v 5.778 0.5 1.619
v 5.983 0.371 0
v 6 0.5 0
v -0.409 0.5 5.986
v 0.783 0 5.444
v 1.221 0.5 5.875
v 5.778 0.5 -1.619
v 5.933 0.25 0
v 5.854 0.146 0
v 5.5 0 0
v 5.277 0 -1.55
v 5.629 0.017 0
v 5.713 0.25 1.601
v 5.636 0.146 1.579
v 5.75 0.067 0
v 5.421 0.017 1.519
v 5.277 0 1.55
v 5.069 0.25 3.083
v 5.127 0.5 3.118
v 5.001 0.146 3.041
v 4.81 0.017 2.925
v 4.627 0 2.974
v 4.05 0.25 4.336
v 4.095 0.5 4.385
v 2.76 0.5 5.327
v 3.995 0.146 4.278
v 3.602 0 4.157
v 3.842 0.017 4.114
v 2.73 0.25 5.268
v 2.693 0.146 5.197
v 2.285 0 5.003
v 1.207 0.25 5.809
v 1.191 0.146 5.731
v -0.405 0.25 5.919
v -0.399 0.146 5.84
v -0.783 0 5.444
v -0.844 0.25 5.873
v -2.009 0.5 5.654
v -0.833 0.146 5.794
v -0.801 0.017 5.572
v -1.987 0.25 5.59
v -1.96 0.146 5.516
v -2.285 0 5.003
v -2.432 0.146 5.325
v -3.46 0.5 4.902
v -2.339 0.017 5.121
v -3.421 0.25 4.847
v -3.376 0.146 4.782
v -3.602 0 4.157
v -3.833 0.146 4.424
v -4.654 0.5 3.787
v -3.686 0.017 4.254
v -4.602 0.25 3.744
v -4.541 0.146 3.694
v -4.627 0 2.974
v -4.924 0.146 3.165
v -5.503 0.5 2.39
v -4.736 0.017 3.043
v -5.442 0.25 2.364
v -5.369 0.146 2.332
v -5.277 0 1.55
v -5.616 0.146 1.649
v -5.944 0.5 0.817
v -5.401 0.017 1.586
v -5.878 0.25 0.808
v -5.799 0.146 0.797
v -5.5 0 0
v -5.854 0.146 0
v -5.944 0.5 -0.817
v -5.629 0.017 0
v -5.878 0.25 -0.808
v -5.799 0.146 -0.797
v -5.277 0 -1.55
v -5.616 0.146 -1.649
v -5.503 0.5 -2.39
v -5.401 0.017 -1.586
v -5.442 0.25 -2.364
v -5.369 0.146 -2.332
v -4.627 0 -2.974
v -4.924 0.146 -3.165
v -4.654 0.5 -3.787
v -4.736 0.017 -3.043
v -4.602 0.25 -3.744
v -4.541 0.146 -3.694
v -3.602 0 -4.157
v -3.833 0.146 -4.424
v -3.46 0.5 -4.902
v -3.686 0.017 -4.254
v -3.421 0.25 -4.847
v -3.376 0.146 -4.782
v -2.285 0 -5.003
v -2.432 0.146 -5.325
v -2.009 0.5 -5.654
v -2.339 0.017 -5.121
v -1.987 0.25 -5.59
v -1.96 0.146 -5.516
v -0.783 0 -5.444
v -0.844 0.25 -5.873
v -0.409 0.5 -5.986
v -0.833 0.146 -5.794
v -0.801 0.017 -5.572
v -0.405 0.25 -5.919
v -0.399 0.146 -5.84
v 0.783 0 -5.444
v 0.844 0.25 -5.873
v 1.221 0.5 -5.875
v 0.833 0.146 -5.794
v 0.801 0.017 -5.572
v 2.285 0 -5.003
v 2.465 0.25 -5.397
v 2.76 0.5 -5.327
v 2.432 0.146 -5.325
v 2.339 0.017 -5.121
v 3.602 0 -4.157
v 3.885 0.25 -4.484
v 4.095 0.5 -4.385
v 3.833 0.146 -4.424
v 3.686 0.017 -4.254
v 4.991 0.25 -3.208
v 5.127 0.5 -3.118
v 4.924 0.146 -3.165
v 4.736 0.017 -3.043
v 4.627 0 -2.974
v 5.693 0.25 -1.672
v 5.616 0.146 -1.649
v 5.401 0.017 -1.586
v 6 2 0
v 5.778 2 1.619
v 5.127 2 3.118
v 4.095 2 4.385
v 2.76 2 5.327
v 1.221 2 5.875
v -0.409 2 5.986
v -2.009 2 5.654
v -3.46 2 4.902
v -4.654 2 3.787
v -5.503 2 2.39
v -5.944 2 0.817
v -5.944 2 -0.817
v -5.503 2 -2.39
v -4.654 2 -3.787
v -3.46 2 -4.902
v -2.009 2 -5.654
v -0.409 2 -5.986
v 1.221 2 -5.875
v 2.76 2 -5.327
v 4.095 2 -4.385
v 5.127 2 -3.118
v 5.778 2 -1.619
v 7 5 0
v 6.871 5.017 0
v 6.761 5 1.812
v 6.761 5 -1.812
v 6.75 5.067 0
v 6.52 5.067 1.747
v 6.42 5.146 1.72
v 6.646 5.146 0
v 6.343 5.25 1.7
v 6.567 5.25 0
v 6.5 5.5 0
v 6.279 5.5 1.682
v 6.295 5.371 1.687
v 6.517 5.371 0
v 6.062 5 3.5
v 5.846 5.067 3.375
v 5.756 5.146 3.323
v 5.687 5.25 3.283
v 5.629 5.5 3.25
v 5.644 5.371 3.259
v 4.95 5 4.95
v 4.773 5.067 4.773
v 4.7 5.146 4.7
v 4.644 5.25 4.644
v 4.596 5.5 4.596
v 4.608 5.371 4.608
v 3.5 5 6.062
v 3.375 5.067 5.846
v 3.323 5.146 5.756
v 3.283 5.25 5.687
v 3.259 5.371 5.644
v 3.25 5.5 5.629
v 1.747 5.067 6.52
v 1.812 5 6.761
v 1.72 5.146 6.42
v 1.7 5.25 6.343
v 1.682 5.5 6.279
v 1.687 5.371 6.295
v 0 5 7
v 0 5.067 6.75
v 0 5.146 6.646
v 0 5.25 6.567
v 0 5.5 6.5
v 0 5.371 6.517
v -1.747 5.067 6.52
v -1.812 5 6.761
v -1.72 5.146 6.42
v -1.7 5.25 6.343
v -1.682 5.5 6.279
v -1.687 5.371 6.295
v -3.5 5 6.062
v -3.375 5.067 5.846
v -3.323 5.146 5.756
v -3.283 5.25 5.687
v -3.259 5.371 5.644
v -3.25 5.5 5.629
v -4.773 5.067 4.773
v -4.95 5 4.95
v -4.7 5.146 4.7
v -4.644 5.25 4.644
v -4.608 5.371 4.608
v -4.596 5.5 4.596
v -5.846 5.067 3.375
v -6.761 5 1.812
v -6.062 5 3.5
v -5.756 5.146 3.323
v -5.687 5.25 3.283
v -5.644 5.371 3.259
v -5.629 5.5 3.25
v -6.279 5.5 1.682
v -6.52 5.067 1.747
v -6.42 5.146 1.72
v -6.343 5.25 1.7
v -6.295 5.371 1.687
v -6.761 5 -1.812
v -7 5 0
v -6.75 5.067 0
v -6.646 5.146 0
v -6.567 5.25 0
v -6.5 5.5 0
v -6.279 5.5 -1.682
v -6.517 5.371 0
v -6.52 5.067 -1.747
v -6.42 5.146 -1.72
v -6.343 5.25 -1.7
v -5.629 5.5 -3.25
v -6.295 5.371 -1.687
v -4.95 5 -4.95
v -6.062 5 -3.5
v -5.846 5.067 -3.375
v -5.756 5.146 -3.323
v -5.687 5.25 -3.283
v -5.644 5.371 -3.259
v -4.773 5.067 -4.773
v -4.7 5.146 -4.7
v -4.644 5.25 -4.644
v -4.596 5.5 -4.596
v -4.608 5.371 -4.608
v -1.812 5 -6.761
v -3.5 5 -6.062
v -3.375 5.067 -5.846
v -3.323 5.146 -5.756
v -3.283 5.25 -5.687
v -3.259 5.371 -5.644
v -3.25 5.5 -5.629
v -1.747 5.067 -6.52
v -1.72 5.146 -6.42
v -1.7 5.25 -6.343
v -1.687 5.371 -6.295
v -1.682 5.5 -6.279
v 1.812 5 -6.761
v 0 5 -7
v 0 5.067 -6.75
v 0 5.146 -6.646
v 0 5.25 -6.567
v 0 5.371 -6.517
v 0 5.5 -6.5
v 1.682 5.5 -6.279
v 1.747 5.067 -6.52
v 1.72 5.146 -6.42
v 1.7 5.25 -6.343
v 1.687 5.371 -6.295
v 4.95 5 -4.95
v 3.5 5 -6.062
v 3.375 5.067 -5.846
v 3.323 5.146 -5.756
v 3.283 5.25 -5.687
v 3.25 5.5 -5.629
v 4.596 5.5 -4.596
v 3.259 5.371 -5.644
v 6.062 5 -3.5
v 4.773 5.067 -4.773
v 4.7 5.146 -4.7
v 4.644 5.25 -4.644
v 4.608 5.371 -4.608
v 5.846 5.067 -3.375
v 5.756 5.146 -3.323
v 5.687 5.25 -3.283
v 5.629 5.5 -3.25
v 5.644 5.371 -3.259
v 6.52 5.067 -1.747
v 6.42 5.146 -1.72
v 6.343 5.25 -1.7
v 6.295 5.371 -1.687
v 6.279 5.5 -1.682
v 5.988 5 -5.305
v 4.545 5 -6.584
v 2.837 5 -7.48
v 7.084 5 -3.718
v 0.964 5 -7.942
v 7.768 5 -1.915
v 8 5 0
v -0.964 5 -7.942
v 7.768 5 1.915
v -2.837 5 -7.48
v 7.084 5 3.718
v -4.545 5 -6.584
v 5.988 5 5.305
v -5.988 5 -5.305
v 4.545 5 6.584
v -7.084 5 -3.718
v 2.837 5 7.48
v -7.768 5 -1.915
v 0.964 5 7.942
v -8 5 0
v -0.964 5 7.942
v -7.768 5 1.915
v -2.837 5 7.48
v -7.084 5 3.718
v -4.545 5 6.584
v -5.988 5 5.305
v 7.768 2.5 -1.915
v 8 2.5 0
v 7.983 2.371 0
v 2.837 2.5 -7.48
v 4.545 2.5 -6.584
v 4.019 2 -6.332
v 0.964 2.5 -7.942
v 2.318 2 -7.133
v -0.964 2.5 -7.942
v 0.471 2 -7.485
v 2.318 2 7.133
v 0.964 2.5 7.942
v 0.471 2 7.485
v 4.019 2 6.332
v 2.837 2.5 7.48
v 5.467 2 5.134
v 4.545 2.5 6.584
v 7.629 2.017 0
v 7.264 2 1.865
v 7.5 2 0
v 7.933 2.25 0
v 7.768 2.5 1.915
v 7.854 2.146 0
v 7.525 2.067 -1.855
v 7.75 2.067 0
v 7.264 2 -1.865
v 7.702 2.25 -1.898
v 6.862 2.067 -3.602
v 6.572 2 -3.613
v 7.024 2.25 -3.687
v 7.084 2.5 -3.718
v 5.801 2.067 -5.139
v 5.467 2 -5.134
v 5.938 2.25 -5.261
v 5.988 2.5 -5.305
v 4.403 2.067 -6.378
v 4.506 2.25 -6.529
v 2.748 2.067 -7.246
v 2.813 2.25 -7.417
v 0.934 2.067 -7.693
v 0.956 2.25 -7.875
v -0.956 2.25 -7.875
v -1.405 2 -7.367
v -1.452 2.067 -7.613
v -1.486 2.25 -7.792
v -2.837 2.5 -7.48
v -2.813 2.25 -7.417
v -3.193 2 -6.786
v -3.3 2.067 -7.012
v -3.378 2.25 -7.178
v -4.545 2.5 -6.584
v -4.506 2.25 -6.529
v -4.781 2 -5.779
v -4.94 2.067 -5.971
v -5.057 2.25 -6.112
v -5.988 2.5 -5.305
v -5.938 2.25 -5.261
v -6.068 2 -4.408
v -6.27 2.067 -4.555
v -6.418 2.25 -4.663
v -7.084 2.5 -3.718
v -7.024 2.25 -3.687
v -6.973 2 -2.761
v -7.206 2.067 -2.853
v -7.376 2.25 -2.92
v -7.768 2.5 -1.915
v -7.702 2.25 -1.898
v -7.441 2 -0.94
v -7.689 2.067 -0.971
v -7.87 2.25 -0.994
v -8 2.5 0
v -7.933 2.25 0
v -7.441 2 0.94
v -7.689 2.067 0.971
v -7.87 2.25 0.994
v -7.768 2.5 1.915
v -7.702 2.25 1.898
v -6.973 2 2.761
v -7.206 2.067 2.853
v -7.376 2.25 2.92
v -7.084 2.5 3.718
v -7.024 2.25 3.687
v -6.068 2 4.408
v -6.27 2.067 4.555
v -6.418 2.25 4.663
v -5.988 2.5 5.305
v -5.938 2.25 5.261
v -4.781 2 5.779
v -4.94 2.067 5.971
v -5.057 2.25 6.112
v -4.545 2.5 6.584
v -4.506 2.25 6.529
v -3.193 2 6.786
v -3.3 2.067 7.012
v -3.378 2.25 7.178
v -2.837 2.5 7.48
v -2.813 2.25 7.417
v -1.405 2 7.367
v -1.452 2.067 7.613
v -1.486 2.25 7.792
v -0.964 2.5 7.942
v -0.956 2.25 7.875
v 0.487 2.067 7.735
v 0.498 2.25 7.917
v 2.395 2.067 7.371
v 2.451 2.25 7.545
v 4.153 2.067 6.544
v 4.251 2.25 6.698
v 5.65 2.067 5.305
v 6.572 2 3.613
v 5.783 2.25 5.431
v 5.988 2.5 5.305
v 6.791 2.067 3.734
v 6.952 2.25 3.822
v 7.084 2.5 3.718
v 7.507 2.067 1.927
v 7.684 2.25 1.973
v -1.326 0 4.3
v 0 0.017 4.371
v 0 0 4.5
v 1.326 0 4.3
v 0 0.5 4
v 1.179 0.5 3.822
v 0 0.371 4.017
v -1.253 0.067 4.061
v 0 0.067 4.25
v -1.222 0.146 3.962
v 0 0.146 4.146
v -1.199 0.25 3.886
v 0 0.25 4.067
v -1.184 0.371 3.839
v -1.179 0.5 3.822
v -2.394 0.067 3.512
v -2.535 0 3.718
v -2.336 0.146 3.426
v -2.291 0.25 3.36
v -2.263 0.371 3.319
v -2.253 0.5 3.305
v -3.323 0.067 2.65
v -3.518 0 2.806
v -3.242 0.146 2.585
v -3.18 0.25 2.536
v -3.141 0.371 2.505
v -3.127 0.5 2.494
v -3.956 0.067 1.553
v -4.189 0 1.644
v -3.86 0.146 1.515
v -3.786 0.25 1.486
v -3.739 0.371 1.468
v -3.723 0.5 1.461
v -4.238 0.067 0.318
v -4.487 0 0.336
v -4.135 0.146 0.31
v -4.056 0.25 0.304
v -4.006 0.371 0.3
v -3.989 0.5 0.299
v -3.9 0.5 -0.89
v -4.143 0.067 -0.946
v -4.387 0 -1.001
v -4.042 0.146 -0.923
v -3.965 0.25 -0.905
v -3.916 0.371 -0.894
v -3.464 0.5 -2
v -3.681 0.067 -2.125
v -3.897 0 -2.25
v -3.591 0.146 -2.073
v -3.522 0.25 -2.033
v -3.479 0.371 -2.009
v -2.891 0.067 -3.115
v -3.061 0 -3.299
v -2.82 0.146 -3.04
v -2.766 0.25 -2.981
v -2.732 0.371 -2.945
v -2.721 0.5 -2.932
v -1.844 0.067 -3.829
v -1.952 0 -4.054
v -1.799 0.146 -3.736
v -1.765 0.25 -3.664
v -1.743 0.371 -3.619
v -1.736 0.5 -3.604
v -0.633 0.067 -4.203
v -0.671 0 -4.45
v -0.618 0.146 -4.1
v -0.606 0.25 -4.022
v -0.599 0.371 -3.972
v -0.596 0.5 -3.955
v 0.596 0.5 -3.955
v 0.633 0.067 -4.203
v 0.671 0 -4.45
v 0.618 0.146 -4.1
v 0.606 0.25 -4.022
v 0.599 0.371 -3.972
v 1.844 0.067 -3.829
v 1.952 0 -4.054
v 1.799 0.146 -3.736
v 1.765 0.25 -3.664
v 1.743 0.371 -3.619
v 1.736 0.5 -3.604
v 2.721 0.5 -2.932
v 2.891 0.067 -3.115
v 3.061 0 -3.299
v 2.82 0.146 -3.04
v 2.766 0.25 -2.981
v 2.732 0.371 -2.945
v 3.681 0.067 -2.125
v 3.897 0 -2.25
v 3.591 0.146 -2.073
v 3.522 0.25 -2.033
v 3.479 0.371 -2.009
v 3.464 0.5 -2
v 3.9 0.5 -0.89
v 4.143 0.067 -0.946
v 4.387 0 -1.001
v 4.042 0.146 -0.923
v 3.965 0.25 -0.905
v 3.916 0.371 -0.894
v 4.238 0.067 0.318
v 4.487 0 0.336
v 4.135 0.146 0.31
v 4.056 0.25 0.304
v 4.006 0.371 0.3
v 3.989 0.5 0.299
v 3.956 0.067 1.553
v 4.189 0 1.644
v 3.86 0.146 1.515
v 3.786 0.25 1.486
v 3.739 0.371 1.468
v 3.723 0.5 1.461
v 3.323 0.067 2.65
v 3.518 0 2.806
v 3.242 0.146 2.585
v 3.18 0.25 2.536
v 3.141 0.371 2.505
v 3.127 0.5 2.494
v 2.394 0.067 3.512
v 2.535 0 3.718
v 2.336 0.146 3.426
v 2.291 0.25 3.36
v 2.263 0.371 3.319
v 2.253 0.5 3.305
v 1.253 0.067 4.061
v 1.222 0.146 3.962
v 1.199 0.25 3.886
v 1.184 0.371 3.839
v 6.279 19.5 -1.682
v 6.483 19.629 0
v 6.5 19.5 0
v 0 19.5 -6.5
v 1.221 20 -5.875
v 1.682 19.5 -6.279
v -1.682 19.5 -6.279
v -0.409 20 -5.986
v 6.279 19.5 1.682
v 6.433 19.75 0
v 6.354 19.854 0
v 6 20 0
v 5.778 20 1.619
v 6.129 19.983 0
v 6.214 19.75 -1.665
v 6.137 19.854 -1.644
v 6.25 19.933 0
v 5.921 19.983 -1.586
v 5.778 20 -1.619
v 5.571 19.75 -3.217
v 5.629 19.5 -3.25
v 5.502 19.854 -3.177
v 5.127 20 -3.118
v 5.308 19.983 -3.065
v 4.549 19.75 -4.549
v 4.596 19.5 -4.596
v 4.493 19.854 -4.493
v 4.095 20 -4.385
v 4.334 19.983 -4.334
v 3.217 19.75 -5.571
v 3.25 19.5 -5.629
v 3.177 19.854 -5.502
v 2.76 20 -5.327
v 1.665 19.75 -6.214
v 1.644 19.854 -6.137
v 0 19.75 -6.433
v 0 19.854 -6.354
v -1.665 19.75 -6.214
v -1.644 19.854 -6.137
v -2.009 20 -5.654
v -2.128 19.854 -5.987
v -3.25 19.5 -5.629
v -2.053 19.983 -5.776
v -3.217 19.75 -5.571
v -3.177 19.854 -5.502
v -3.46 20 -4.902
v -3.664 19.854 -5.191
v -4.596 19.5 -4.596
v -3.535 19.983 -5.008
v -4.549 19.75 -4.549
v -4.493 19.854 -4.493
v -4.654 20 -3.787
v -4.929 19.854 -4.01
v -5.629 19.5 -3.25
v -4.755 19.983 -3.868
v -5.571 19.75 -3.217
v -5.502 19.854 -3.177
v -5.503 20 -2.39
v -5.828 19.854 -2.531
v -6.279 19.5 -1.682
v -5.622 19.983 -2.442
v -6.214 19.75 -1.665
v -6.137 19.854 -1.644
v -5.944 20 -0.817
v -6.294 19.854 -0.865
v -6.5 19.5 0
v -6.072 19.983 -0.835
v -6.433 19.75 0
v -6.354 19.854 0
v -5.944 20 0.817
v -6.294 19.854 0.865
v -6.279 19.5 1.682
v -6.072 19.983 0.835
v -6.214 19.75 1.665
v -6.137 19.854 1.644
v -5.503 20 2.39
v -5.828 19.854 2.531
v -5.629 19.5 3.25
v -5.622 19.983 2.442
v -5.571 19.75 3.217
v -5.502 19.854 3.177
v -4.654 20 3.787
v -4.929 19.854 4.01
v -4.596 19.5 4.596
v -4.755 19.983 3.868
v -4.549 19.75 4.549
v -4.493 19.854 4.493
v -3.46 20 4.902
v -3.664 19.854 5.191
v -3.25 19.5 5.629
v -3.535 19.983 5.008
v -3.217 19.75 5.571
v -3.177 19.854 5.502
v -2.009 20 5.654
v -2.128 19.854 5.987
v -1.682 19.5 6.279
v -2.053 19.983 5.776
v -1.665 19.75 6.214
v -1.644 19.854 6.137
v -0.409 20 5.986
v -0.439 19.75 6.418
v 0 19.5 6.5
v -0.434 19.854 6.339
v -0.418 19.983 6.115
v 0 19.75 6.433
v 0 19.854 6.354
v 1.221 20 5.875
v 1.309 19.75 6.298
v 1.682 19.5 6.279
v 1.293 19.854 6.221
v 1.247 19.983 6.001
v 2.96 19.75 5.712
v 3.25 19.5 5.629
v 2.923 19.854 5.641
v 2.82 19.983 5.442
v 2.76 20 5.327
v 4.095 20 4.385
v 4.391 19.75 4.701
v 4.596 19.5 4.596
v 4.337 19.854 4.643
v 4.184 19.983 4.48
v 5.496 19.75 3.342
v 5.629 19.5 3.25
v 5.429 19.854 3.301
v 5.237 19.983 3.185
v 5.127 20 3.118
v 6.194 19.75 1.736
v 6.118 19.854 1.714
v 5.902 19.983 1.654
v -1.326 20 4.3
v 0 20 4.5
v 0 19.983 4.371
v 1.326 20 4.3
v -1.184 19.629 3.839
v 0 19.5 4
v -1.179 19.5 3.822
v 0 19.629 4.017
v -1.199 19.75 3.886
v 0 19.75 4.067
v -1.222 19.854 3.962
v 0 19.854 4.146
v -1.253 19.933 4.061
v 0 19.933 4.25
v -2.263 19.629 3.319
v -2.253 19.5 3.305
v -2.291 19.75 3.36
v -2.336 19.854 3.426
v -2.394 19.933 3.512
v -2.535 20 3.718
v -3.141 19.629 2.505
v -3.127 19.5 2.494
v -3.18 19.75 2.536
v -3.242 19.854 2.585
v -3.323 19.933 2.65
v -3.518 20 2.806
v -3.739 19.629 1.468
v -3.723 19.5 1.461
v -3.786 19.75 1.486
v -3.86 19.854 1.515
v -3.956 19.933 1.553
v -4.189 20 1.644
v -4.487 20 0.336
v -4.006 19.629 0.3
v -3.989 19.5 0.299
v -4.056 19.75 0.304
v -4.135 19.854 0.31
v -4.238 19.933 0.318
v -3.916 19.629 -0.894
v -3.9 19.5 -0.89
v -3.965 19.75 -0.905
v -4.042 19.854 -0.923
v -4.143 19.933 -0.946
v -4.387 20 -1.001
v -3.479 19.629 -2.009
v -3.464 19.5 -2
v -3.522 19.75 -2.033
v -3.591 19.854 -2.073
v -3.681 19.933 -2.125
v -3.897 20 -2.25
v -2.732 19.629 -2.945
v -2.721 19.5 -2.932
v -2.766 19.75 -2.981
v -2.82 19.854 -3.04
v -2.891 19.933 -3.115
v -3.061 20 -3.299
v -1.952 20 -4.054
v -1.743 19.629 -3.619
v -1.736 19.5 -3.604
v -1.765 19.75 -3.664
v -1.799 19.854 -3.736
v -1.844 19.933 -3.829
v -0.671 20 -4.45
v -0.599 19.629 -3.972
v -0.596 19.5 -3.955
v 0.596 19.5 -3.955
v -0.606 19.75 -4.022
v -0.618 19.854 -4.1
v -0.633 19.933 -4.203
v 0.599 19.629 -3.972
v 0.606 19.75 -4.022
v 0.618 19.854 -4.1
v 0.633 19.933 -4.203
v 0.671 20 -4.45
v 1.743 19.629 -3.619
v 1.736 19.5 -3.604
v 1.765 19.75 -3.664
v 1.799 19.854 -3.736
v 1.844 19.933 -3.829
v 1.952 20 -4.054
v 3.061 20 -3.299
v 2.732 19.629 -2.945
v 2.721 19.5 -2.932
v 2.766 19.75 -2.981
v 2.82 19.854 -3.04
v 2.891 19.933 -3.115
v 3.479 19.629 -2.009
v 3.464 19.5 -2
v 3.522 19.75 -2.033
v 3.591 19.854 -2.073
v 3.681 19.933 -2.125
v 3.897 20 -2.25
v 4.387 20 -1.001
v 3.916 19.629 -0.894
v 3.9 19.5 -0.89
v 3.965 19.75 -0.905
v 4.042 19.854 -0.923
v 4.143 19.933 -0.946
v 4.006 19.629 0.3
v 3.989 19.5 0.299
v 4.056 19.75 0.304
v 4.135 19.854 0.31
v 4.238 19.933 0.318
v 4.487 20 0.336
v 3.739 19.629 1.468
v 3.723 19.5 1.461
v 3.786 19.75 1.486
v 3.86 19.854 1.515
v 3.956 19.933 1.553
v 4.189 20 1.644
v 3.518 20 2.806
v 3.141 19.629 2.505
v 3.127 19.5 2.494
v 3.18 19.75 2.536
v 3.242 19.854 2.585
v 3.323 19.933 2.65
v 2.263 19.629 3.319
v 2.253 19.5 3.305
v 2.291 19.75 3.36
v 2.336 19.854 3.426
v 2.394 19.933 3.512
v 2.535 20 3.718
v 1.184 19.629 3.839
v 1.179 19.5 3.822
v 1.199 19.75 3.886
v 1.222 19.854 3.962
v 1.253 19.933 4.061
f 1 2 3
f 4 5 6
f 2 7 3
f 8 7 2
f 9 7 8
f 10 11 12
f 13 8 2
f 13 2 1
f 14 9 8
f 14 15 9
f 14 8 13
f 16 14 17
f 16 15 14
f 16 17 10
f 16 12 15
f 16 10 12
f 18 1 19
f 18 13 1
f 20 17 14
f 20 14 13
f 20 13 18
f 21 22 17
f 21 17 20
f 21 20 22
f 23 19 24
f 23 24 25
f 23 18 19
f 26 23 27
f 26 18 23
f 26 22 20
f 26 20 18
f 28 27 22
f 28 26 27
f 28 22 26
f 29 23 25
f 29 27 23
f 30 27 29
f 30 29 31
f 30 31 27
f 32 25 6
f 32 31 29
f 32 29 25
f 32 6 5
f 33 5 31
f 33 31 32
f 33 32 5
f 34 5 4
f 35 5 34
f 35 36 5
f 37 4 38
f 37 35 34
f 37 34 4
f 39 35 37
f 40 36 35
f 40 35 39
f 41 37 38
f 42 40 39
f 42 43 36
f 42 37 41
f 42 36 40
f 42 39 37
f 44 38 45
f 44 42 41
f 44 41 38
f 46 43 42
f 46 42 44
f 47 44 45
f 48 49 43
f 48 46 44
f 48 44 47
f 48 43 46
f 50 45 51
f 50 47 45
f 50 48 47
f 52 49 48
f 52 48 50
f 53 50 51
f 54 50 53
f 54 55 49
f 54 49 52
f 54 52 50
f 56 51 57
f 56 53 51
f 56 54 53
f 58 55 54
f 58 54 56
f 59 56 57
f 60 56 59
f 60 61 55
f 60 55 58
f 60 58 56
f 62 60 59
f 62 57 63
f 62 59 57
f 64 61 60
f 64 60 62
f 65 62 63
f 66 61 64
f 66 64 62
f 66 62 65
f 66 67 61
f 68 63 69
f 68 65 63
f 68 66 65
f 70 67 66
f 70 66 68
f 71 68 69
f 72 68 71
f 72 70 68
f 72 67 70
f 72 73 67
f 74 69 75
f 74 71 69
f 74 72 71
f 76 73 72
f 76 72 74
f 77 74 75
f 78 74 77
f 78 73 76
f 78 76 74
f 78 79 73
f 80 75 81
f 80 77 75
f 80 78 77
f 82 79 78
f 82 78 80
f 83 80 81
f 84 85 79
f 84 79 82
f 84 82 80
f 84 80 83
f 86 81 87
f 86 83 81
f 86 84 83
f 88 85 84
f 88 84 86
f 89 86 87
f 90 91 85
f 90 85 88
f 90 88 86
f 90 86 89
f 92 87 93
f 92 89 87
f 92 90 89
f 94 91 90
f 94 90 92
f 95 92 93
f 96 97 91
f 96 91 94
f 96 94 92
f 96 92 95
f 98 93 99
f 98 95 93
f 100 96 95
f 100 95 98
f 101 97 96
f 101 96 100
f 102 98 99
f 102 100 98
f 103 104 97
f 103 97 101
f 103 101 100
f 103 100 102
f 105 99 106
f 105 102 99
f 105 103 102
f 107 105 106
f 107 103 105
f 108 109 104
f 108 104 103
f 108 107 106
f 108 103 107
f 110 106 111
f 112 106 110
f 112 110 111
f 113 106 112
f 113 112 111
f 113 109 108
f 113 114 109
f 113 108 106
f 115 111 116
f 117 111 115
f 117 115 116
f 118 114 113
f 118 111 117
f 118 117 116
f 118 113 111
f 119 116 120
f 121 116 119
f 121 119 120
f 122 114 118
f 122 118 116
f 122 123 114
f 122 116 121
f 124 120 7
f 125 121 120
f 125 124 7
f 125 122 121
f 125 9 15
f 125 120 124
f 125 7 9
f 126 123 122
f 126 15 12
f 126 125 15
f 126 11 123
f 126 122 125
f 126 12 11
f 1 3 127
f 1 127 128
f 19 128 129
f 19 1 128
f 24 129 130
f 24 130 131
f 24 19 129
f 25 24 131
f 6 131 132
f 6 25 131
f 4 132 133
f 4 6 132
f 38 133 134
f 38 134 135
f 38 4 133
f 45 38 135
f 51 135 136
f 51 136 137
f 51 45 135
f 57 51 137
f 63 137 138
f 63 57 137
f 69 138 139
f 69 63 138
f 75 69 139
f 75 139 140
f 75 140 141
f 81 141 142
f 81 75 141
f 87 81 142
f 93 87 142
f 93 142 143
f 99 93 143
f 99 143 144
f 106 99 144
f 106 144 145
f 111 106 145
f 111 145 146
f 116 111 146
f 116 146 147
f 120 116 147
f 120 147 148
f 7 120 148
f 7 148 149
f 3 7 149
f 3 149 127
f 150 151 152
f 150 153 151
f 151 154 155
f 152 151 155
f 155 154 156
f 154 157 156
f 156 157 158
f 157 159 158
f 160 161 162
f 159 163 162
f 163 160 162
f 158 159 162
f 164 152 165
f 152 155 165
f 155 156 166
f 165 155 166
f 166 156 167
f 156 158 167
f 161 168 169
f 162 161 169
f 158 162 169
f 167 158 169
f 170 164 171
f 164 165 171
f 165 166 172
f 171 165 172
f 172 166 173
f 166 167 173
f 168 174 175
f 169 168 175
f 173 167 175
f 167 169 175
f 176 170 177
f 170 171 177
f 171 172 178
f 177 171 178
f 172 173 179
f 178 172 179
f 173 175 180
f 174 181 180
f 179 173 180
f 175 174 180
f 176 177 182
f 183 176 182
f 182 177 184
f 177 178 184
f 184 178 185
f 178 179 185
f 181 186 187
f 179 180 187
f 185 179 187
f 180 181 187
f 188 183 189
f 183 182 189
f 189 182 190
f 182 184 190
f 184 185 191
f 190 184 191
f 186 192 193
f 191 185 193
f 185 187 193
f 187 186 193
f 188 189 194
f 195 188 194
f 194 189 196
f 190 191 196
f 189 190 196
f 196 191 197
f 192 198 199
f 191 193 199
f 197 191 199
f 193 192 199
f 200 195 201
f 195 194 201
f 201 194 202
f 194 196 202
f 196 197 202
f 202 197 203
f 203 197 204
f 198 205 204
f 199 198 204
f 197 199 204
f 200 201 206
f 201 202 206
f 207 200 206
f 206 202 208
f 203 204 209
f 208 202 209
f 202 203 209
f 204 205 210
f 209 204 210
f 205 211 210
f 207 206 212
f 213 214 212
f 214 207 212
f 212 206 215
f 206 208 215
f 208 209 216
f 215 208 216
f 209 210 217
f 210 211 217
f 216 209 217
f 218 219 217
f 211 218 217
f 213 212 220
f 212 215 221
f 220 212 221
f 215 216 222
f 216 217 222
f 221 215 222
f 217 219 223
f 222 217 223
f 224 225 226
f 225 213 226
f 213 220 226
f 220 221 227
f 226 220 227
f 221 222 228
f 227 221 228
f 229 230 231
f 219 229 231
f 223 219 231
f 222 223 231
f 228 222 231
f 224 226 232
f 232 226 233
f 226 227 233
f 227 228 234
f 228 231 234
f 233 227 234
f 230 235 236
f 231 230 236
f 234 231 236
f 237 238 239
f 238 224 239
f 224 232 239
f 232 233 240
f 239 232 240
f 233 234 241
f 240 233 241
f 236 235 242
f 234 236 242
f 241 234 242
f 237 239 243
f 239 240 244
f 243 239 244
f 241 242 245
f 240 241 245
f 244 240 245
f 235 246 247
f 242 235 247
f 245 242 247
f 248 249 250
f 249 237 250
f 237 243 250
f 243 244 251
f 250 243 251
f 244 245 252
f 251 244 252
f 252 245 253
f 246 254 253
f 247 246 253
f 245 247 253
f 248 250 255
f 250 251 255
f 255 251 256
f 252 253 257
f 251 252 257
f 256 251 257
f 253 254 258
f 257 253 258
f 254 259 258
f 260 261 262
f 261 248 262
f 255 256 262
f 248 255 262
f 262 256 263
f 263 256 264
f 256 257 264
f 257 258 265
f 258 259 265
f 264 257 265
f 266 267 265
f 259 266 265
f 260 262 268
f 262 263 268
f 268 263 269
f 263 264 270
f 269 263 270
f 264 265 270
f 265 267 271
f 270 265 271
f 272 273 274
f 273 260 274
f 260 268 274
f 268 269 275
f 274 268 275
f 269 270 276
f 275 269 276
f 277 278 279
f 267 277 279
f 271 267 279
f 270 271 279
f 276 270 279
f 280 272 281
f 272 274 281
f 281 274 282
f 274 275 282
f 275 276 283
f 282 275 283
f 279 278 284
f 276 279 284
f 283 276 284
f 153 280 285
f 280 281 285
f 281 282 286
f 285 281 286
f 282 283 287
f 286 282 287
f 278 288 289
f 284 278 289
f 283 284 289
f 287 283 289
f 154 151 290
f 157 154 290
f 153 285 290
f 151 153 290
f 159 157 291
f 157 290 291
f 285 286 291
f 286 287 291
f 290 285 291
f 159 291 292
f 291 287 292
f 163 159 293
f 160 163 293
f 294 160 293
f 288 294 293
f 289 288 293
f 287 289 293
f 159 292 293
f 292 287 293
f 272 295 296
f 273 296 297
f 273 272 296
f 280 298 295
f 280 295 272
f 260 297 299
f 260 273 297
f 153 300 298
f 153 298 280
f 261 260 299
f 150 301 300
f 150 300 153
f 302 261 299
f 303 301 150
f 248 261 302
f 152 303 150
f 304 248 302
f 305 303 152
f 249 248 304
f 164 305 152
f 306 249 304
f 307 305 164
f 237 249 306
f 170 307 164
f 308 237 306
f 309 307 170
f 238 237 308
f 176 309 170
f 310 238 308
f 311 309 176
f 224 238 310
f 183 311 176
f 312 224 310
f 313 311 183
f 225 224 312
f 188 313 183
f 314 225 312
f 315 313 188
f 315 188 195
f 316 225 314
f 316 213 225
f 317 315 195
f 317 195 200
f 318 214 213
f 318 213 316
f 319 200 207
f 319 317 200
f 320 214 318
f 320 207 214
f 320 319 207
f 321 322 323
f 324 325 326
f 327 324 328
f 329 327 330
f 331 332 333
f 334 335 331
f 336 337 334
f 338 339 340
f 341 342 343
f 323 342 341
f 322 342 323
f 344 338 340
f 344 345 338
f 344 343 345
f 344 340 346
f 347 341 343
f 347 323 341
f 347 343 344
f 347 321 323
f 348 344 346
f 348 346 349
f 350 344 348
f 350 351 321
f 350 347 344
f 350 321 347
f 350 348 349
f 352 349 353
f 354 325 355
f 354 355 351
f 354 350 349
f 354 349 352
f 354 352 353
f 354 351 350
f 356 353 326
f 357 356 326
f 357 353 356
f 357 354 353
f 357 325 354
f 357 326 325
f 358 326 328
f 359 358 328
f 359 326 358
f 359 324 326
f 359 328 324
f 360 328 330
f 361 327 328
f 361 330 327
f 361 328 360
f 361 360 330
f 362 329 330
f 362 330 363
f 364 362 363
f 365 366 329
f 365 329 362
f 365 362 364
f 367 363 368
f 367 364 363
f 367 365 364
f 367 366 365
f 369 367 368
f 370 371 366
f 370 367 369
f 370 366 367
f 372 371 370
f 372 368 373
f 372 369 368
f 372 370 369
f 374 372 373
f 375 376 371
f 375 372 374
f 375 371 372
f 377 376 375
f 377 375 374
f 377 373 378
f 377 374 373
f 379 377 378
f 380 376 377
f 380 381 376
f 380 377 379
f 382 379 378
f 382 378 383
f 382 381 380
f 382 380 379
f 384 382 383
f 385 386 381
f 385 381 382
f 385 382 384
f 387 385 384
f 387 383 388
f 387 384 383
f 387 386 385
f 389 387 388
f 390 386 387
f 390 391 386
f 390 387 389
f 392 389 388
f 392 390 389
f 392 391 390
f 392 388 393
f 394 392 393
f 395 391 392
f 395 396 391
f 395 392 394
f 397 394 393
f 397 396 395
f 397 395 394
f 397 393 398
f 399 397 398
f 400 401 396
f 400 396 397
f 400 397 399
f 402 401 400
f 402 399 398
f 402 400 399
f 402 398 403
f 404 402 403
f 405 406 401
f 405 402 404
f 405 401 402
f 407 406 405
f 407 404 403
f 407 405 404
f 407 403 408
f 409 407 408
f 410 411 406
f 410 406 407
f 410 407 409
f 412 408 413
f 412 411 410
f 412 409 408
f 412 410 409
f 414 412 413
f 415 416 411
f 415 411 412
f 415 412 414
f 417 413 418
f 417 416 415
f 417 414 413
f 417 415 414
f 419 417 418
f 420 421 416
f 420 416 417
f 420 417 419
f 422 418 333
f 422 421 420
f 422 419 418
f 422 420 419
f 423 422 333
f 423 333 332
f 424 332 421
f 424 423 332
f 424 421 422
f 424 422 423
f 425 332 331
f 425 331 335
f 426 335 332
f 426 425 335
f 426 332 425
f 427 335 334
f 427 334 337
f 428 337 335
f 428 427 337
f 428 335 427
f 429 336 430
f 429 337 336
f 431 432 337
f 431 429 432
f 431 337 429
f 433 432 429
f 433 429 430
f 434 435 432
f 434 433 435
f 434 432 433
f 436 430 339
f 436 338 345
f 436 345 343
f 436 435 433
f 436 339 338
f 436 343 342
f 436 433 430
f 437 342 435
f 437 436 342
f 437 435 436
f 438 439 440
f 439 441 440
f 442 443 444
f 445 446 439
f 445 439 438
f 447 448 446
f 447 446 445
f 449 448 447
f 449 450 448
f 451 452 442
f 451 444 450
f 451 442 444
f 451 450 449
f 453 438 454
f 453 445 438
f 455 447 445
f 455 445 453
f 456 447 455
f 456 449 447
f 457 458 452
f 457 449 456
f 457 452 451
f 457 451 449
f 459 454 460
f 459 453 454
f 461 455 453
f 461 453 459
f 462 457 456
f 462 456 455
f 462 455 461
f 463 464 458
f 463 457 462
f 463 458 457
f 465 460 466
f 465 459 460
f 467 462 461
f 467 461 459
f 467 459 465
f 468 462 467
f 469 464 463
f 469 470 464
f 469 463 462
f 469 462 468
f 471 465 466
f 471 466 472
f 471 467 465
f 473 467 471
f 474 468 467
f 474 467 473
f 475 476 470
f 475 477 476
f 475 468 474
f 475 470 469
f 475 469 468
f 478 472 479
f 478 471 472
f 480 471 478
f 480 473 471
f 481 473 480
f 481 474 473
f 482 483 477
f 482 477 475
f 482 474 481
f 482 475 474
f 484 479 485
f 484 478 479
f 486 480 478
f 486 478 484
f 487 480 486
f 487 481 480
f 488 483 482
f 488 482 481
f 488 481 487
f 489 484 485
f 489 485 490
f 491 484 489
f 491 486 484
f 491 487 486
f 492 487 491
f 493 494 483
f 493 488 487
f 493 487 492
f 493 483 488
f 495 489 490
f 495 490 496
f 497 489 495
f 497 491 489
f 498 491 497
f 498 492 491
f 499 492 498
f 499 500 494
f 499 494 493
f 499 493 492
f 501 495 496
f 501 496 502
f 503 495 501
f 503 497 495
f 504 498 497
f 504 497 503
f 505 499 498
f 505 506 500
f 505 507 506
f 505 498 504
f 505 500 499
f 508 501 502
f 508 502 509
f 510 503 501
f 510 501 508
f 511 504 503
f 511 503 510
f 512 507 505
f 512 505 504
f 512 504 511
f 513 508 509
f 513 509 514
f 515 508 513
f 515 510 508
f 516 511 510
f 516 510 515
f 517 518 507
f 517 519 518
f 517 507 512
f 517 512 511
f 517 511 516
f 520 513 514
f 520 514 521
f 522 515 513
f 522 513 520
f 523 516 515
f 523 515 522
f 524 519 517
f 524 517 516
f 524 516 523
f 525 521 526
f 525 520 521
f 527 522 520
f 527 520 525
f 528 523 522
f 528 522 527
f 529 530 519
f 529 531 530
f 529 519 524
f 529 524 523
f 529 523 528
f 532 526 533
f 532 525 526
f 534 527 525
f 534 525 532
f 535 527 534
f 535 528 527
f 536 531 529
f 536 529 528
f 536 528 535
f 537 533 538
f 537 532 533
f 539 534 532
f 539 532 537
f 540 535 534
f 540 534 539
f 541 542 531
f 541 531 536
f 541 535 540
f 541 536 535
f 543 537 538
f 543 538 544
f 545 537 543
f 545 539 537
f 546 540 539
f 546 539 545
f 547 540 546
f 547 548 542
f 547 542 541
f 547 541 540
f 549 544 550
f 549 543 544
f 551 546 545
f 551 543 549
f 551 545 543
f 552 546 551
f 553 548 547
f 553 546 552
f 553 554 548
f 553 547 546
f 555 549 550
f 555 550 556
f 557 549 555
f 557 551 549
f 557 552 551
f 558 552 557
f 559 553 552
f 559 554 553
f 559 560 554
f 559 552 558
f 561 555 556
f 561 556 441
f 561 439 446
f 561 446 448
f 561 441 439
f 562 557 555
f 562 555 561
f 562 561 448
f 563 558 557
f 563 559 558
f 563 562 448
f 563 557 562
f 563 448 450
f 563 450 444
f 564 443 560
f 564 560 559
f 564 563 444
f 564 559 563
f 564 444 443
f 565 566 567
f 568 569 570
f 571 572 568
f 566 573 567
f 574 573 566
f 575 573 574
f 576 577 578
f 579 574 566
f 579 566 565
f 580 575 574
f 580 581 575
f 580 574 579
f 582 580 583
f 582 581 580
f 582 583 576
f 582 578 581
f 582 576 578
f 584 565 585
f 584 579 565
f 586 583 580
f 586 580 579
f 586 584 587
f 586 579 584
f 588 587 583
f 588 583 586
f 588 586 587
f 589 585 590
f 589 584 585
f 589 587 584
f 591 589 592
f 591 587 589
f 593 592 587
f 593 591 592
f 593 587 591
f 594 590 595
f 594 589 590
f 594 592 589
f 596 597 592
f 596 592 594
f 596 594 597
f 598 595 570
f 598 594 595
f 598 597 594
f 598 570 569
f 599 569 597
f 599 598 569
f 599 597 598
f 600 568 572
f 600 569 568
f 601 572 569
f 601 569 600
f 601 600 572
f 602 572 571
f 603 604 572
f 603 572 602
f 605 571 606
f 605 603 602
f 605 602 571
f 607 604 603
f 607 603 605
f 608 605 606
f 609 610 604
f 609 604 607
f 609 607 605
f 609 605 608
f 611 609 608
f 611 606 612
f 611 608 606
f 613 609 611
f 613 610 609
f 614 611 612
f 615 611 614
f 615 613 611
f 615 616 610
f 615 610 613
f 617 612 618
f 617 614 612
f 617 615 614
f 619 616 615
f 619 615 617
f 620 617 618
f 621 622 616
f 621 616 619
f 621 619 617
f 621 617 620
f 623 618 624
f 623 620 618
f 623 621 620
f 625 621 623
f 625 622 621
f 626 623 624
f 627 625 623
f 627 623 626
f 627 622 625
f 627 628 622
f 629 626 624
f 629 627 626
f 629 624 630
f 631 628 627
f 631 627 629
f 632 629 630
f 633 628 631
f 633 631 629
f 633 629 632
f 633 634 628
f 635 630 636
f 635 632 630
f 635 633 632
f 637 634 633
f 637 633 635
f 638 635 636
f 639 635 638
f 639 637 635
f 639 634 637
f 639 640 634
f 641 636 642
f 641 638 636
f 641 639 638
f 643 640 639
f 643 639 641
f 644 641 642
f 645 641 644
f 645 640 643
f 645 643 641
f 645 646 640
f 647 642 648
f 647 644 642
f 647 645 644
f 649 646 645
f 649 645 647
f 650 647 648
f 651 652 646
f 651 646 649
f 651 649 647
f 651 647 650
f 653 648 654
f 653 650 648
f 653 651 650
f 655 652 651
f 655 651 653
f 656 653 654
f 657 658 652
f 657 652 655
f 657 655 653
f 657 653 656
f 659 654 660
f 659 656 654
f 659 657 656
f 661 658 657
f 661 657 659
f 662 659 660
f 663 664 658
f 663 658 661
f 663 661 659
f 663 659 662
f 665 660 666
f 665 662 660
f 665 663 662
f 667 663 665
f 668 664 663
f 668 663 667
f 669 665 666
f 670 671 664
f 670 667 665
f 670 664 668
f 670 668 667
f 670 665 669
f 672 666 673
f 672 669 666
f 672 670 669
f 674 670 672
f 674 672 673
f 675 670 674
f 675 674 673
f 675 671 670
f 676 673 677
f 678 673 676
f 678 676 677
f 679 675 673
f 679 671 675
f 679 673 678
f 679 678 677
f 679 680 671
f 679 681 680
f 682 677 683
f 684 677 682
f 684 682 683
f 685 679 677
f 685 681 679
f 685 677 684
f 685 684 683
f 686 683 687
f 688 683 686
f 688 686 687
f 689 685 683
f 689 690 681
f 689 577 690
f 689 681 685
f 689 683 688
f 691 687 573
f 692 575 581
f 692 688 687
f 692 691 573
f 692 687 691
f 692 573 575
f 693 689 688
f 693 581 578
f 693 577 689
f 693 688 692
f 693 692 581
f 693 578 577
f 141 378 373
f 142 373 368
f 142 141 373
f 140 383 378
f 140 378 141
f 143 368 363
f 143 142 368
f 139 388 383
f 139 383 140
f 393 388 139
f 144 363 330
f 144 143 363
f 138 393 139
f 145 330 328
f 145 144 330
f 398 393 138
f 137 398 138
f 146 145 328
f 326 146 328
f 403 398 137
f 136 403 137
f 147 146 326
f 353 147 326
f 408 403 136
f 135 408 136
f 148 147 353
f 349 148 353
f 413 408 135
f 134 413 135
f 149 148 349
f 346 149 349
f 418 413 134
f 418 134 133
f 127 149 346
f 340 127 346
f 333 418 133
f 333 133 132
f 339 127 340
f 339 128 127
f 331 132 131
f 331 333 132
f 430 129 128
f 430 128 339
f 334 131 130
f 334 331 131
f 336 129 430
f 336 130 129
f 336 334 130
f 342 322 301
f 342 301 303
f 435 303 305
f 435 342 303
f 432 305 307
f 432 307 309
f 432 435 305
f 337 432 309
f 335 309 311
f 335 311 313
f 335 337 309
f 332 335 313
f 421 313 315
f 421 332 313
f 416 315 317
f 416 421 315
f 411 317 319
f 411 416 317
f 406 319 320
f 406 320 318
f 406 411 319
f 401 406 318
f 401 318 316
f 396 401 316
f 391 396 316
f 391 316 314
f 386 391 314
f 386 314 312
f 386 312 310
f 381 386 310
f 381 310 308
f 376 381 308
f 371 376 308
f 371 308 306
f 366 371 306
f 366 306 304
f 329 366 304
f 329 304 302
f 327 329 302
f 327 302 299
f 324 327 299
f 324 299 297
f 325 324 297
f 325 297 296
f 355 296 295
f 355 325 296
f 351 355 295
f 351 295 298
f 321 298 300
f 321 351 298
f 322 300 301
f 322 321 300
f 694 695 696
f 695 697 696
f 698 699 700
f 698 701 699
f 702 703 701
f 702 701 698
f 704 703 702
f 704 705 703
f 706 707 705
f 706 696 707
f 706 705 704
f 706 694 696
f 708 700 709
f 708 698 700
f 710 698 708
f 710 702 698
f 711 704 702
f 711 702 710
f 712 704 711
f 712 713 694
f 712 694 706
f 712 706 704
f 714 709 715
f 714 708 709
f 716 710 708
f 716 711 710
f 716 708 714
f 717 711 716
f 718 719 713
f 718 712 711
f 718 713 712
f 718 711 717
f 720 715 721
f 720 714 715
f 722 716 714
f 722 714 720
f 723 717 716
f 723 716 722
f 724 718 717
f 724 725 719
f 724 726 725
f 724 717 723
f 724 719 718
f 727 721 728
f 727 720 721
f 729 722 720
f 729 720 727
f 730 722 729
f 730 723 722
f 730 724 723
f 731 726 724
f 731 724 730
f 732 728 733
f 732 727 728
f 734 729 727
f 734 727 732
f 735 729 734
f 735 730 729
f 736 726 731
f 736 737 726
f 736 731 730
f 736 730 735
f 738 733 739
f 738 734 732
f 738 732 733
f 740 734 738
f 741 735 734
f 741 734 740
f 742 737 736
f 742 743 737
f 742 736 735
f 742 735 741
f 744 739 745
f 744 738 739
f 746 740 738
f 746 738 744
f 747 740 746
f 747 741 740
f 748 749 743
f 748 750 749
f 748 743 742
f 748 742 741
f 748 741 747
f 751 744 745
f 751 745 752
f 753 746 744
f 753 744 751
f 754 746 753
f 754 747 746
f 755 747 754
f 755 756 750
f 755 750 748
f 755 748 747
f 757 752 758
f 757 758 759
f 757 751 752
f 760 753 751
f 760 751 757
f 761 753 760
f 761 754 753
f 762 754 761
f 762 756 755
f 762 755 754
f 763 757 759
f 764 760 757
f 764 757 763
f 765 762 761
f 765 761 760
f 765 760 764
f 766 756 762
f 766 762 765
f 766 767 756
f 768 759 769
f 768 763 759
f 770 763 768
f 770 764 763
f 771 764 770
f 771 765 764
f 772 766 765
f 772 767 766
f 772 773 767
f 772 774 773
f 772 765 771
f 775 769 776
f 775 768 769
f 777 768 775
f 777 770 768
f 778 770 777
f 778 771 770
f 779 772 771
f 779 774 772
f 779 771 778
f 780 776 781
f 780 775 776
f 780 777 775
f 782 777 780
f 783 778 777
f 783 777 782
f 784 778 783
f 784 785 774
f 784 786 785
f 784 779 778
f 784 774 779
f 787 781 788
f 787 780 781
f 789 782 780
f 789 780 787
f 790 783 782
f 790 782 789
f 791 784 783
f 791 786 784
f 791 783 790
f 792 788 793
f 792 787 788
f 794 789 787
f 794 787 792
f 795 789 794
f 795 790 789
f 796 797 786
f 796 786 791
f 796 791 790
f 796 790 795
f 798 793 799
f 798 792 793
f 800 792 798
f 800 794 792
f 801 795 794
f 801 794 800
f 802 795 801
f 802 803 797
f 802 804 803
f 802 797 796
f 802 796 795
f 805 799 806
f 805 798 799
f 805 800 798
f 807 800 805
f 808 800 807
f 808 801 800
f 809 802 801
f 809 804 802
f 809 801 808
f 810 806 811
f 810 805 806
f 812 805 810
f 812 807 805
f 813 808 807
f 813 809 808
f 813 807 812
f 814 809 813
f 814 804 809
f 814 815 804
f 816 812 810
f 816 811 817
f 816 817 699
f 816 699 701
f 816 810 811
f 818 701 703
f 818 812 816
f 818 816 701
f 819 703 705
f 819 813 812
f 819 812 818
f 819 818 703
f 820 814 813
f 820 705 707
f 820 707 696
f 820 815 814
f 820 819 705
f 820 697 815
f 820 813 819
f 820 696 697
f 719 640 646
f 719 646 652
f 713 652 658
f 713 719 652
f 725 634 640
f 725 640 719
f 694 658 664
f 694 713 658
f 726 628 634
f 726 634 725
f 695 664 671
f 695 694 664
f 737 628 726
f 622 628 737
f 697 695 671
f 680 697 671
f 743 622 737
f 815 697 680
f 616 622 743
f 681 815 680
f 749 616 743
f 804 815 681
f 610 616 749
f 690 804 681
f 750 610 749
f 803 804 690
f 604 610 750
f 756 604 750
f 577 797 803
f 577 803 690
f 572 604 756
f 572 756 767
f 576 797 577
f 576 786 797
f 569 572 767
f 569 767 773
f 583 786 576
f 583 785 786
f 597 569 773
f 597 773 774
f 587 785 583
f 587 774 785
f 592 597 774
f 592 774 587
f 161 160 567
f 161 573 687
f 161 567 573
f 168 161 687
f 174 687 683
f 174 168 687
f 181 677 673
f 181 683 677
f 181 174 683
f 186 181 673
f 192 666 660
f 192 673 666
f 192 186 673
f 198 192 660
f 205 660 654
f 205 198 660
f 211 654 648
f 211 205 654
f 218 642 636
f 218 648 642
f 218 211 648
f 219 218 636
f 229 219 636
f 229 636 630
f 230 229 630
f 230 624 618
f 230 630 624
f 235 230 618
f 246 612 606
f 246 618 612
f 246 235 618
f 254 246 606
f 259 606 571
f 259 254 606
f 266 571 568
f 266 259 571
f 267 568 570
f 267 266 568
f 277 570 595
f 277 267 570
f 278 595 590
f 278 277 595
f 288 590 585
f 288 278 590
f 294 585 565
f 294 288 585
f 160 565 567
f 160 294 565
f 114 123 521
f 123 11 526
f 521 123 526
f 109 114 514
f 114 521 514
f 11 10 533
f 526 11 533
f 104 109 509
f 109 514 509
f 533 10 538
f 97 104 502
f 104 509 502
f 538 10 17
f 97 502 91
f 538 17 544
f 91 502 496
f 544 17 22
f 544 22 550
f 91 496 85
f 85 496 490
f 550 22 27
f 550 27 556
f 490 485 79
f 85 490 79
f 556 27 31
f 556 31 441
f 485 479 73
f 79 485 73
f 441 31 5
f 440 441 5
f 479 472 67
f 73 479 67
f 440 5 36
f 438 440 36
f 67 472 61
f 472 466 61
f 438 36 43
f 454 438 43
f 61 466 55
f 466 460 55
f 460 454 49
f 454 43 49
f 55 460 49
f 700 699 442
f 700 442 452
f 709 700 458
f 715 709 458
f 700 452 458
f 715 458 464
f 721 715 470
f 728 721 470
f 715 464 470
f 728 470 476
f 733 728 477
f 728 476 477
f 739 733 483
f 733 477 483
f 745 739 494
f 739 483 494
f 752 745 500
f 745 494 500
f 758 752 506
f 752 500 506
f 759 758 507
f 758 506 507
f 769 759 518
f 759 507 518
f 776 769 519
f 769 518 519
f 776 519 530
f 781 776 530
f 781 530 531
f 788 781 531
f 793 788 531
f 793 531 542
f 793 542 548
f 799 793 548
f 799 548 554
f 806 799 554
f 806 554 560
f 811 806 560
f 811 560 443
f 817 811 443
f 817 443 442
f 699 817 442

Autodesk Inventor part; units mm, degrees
ref_plane "YZ Plane" through (0, 0, 0) normal (1, 0, 0) x (0, 1, 0)
ref_plane "XZ Plane" through (0, 0, 0) normal (0, 1, 0) x (-1, 0, 0)
ref_plane "XY Plane" through (0, 0, 0) normal (0, 0, 1) x (1, 0, 0)
sketch "Sketch1" plane through (0, 0, 0) normal (0, 1, 0) x (-1, 0, 0)
  circle A0 centre (0, 0) radius 15
  dimension "d0" = 30
extrude "Extrusion1" add sketch "Sketch1" along normal blind 5
sketch "Sketch2" plane through (0, 5, 0) normal (0, 1, 0) x (1, 0, 0)
  circle A0 centre (0, 0) radius 6.5
  dimension "d3" = 13
extrude "Extrusion2" add sketch "Sketch2" along normal blind 15
sketch "Sketch3" plane through (0, 20, 0) normal (0, 1, 0) x (1, 0, 0)
  point P0 (0, 0)
hole "Hole1" at (0, 20, 0) direction (0, -1, 0) diameter 8 end through all
fillet "Fillet1" radius 0.5 6 edges at (-6.5, 20, 0) (0, 20, -4) (-6.5, 5, 0) (15, 5, 0) (15, 0, 0) (0, 0, -4)
sketch "Sketch4" plane through (0, 5, 0) normal (0, 1, 0) x (1, 0, 0)
  circle A0 centre (0, 0) radius 11
  circle A1 centre (-1.7851, -10.8542) radius 2
  circle A2 centre (10.8542, -1.7851) radius 2
  circle A3 centre (1.7851, 10.8542) radius 2
  circle A4 centre (-10.8542, 1.7851) radius 2
  dimension "d14" = 22
  dimension "d15" = 4
  dimension "d18" = 360
hole "Hole2" at (-1.7851, 5, 10.8542) at (10.8542, 5, 1.7851) at (1.7851, 5, -10.8542) at (-10.8542, 5, -1.7851) direction (0, -1, 0) diameter 4 end through all
sketch "Sketch5" plane through (0, 0, 0) normal (0, -1, 0) x (1, 0, 0)
  circle A0 centre (0, 0) radius 6
  circle A1 centre (0, 0) radius 16
  dimension "d27" = 12
  dimension "d28" = 32
extrude "Extrusion3" cut sketch "Sketch5" against normal blind 2
sketch "Sketch6" plane through (0, 2, 0) normal (0, -1, 0) x (1, 0, 0)
  circle A0 centre (0, 0) radius 8
  circle A1 centre (0, 0) radius 16.0389
  dimension "d31" = 16
  dimension "d32" = 32.0778
extrude "Extrusion4" cut sketch "Sketch6" against normal up to surface (3 mm away)
fillet "Fillet2" radius 0.5 2 edges at (-8, 2, 0) (-6, 0, 0)
properties part number "Trapezmutter_T8"
